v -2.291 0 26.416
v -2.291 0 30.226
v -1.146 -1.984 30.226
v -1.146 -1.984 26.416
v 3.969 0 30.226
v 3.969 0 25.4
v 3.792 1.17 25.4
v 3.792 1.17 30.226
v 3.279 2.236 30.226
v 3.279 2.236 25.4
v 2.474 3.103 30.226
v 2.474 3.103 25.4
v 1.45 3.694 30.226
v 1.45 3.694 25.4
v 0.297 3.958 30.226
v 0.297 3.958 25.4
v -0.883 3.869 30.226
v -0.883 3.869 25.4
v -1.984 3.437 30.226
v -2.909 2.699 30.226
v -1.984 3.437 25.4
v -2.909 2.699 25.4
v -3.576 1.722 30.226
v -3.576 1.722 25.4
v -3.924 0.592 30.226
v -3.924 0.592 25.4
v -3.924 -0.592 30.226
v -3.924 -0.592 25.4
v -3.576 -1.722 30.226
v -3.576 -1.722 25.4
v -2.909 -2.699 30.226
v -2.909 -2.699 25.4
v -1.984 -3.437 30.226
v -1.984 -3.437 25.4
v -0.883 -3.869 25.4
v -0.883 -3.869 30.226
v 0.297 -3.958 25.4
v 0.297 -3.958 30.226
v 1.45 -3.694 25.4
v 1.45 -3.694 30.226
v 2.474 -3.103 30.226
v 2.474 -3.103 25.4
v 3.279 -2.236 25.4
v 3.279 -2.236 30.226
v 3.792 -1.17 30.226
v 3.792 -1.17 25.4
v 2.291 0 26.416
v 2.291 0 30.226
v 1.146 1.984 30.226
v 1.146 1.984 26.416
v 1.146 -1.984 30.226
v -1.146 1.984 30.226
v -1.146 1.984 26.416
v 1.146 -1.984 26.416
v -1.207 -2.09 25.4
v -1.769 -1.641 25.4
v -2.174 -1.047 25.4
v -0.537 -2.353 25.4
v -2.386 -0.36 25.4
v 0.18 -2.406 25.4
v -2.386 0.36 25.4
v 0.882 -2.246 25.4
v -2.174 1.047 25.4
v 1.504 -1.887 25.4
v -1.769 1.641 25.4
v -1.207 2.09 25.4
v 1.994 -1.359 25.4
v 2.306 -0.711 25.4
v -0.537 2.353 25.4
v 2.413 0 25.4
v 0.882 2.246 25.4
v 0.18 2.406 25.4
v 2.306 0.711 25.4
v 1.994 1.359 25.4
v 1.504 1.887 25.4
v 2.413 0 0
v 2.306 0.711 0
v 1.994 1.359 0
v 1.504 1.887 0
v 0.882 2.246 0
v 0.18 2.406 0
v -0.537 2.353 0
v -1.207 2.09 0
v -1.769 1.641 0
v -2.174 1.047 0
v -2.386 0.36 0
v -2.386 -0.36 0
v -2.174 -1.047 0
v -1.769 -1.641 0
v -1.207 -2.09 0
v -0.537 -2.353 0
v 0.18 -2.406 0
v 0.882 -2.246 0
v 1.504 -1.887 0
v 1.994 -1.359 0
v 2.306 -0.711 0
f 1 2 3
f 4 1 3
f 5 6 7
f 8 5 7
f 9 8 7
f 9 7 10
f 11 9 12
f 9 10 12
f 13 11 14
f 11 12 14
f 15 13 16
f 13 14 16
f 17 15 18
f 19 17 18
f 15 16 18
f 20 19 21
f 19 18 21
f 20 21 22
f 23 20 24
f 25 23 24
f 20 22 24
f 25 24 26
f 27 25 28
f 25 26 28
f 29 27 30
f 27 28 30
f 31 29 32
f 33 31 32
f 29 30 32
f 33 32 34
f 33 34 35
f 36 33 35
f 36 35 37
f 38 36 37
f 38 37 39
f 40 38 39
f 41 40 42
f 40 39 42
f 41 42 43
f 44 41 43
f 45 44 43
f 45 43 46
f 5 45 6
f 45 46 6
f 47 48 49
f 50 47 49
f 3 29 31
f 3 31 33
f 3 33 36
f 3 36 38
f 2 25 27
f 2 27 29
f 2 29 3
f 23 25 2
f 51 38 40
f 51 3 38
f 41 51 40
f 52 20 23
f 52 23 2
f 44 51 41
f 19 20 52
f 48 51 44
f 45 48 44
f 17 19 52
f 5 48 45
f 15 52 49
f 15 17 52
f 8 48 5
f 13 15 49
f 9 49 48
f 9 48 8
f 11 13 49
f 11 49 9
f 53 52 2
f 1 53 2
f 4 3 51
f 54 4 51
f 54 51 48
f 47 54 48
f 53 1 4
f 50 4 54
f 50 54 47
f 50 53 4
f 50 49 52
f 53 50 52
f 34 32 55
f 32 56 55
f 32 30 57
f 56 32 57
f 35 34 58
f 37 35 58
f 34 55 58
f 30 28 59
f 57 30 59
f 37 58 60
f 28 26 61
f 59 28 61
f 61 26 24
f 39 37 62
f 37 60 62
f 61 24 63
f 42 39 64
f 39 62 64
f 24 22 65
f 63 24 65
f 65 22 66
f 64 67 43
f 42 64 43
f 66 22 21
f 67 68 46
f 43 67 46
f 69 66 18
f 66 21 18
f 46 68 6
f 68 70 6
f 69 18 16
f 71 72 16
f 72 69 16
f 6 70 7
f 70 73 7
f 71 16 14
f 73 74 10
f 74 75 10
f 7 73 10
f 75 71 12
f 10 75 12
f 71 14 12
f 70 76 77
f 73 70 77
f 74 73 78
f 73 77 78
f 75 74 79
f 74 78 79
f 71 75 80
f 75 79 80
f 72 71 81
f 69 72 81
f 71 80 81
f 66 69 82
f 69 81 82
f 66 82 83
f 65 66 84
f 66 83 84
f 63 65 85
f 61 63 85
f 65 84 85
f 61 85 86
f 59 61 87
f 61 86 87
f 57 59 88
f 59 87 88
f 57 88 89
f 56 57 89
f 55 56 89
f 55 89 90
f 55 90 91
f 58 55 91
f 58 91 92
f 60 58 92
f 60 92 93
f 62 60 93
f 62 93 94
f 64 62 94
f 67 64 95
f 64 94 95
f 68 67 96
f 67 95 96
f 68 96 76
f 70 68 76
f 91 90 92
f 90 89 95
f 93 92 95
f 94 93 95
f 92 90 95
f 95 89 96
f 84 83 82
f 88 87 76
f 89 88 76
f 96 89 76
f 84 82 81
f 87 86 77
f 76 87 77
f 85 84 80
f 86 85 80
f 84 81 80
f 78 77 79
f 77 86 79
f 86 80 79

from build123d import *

# Parameters (mm, degrees)
SKETCH1_R           = 2.413
BOSS_EXTRUDE1_DEPTH = 25.4
SKETCH2_R           = 3.96875
BOSS_EXTRUDE2_DEPTH = 4.826
CUT_EXTRUDE1_DEPTH  = 3.81


with BuildPart() as part:
    # Sketch1 → Boss-Extrude1 (new body)
    with BuildSketch(Plane.XY):
        Circle(SKETCH1_R)
    extrude(amount=BOSS_EXTRUDE1_DEPTH)

    # Sketch2 → Boss-Extrude2 (add)
    with BuildSketch(Plane.XY.offset(25.4)):
        Circle(SKETCH2_R)
    extrude(amount=BOSS_EXTRUDE2_DEPTH)

    # Sketch3 → Cut-Extrude1 (cut)
    with BuildSketch(Plane.XY.offset(30.226)):
        Polygon((2.291358881, 0), (1.14567944, 1.984375), (-1.14567944, 1.984375), (-2.291358881, 0), (-1.14567944, -1.984375), (1.14567944, -1.984375), align=None)
    extrude(amount=-CUT_EXTRUDE1_DEPTH, mode=Mode.SUBTRACT)


solid = part.part
